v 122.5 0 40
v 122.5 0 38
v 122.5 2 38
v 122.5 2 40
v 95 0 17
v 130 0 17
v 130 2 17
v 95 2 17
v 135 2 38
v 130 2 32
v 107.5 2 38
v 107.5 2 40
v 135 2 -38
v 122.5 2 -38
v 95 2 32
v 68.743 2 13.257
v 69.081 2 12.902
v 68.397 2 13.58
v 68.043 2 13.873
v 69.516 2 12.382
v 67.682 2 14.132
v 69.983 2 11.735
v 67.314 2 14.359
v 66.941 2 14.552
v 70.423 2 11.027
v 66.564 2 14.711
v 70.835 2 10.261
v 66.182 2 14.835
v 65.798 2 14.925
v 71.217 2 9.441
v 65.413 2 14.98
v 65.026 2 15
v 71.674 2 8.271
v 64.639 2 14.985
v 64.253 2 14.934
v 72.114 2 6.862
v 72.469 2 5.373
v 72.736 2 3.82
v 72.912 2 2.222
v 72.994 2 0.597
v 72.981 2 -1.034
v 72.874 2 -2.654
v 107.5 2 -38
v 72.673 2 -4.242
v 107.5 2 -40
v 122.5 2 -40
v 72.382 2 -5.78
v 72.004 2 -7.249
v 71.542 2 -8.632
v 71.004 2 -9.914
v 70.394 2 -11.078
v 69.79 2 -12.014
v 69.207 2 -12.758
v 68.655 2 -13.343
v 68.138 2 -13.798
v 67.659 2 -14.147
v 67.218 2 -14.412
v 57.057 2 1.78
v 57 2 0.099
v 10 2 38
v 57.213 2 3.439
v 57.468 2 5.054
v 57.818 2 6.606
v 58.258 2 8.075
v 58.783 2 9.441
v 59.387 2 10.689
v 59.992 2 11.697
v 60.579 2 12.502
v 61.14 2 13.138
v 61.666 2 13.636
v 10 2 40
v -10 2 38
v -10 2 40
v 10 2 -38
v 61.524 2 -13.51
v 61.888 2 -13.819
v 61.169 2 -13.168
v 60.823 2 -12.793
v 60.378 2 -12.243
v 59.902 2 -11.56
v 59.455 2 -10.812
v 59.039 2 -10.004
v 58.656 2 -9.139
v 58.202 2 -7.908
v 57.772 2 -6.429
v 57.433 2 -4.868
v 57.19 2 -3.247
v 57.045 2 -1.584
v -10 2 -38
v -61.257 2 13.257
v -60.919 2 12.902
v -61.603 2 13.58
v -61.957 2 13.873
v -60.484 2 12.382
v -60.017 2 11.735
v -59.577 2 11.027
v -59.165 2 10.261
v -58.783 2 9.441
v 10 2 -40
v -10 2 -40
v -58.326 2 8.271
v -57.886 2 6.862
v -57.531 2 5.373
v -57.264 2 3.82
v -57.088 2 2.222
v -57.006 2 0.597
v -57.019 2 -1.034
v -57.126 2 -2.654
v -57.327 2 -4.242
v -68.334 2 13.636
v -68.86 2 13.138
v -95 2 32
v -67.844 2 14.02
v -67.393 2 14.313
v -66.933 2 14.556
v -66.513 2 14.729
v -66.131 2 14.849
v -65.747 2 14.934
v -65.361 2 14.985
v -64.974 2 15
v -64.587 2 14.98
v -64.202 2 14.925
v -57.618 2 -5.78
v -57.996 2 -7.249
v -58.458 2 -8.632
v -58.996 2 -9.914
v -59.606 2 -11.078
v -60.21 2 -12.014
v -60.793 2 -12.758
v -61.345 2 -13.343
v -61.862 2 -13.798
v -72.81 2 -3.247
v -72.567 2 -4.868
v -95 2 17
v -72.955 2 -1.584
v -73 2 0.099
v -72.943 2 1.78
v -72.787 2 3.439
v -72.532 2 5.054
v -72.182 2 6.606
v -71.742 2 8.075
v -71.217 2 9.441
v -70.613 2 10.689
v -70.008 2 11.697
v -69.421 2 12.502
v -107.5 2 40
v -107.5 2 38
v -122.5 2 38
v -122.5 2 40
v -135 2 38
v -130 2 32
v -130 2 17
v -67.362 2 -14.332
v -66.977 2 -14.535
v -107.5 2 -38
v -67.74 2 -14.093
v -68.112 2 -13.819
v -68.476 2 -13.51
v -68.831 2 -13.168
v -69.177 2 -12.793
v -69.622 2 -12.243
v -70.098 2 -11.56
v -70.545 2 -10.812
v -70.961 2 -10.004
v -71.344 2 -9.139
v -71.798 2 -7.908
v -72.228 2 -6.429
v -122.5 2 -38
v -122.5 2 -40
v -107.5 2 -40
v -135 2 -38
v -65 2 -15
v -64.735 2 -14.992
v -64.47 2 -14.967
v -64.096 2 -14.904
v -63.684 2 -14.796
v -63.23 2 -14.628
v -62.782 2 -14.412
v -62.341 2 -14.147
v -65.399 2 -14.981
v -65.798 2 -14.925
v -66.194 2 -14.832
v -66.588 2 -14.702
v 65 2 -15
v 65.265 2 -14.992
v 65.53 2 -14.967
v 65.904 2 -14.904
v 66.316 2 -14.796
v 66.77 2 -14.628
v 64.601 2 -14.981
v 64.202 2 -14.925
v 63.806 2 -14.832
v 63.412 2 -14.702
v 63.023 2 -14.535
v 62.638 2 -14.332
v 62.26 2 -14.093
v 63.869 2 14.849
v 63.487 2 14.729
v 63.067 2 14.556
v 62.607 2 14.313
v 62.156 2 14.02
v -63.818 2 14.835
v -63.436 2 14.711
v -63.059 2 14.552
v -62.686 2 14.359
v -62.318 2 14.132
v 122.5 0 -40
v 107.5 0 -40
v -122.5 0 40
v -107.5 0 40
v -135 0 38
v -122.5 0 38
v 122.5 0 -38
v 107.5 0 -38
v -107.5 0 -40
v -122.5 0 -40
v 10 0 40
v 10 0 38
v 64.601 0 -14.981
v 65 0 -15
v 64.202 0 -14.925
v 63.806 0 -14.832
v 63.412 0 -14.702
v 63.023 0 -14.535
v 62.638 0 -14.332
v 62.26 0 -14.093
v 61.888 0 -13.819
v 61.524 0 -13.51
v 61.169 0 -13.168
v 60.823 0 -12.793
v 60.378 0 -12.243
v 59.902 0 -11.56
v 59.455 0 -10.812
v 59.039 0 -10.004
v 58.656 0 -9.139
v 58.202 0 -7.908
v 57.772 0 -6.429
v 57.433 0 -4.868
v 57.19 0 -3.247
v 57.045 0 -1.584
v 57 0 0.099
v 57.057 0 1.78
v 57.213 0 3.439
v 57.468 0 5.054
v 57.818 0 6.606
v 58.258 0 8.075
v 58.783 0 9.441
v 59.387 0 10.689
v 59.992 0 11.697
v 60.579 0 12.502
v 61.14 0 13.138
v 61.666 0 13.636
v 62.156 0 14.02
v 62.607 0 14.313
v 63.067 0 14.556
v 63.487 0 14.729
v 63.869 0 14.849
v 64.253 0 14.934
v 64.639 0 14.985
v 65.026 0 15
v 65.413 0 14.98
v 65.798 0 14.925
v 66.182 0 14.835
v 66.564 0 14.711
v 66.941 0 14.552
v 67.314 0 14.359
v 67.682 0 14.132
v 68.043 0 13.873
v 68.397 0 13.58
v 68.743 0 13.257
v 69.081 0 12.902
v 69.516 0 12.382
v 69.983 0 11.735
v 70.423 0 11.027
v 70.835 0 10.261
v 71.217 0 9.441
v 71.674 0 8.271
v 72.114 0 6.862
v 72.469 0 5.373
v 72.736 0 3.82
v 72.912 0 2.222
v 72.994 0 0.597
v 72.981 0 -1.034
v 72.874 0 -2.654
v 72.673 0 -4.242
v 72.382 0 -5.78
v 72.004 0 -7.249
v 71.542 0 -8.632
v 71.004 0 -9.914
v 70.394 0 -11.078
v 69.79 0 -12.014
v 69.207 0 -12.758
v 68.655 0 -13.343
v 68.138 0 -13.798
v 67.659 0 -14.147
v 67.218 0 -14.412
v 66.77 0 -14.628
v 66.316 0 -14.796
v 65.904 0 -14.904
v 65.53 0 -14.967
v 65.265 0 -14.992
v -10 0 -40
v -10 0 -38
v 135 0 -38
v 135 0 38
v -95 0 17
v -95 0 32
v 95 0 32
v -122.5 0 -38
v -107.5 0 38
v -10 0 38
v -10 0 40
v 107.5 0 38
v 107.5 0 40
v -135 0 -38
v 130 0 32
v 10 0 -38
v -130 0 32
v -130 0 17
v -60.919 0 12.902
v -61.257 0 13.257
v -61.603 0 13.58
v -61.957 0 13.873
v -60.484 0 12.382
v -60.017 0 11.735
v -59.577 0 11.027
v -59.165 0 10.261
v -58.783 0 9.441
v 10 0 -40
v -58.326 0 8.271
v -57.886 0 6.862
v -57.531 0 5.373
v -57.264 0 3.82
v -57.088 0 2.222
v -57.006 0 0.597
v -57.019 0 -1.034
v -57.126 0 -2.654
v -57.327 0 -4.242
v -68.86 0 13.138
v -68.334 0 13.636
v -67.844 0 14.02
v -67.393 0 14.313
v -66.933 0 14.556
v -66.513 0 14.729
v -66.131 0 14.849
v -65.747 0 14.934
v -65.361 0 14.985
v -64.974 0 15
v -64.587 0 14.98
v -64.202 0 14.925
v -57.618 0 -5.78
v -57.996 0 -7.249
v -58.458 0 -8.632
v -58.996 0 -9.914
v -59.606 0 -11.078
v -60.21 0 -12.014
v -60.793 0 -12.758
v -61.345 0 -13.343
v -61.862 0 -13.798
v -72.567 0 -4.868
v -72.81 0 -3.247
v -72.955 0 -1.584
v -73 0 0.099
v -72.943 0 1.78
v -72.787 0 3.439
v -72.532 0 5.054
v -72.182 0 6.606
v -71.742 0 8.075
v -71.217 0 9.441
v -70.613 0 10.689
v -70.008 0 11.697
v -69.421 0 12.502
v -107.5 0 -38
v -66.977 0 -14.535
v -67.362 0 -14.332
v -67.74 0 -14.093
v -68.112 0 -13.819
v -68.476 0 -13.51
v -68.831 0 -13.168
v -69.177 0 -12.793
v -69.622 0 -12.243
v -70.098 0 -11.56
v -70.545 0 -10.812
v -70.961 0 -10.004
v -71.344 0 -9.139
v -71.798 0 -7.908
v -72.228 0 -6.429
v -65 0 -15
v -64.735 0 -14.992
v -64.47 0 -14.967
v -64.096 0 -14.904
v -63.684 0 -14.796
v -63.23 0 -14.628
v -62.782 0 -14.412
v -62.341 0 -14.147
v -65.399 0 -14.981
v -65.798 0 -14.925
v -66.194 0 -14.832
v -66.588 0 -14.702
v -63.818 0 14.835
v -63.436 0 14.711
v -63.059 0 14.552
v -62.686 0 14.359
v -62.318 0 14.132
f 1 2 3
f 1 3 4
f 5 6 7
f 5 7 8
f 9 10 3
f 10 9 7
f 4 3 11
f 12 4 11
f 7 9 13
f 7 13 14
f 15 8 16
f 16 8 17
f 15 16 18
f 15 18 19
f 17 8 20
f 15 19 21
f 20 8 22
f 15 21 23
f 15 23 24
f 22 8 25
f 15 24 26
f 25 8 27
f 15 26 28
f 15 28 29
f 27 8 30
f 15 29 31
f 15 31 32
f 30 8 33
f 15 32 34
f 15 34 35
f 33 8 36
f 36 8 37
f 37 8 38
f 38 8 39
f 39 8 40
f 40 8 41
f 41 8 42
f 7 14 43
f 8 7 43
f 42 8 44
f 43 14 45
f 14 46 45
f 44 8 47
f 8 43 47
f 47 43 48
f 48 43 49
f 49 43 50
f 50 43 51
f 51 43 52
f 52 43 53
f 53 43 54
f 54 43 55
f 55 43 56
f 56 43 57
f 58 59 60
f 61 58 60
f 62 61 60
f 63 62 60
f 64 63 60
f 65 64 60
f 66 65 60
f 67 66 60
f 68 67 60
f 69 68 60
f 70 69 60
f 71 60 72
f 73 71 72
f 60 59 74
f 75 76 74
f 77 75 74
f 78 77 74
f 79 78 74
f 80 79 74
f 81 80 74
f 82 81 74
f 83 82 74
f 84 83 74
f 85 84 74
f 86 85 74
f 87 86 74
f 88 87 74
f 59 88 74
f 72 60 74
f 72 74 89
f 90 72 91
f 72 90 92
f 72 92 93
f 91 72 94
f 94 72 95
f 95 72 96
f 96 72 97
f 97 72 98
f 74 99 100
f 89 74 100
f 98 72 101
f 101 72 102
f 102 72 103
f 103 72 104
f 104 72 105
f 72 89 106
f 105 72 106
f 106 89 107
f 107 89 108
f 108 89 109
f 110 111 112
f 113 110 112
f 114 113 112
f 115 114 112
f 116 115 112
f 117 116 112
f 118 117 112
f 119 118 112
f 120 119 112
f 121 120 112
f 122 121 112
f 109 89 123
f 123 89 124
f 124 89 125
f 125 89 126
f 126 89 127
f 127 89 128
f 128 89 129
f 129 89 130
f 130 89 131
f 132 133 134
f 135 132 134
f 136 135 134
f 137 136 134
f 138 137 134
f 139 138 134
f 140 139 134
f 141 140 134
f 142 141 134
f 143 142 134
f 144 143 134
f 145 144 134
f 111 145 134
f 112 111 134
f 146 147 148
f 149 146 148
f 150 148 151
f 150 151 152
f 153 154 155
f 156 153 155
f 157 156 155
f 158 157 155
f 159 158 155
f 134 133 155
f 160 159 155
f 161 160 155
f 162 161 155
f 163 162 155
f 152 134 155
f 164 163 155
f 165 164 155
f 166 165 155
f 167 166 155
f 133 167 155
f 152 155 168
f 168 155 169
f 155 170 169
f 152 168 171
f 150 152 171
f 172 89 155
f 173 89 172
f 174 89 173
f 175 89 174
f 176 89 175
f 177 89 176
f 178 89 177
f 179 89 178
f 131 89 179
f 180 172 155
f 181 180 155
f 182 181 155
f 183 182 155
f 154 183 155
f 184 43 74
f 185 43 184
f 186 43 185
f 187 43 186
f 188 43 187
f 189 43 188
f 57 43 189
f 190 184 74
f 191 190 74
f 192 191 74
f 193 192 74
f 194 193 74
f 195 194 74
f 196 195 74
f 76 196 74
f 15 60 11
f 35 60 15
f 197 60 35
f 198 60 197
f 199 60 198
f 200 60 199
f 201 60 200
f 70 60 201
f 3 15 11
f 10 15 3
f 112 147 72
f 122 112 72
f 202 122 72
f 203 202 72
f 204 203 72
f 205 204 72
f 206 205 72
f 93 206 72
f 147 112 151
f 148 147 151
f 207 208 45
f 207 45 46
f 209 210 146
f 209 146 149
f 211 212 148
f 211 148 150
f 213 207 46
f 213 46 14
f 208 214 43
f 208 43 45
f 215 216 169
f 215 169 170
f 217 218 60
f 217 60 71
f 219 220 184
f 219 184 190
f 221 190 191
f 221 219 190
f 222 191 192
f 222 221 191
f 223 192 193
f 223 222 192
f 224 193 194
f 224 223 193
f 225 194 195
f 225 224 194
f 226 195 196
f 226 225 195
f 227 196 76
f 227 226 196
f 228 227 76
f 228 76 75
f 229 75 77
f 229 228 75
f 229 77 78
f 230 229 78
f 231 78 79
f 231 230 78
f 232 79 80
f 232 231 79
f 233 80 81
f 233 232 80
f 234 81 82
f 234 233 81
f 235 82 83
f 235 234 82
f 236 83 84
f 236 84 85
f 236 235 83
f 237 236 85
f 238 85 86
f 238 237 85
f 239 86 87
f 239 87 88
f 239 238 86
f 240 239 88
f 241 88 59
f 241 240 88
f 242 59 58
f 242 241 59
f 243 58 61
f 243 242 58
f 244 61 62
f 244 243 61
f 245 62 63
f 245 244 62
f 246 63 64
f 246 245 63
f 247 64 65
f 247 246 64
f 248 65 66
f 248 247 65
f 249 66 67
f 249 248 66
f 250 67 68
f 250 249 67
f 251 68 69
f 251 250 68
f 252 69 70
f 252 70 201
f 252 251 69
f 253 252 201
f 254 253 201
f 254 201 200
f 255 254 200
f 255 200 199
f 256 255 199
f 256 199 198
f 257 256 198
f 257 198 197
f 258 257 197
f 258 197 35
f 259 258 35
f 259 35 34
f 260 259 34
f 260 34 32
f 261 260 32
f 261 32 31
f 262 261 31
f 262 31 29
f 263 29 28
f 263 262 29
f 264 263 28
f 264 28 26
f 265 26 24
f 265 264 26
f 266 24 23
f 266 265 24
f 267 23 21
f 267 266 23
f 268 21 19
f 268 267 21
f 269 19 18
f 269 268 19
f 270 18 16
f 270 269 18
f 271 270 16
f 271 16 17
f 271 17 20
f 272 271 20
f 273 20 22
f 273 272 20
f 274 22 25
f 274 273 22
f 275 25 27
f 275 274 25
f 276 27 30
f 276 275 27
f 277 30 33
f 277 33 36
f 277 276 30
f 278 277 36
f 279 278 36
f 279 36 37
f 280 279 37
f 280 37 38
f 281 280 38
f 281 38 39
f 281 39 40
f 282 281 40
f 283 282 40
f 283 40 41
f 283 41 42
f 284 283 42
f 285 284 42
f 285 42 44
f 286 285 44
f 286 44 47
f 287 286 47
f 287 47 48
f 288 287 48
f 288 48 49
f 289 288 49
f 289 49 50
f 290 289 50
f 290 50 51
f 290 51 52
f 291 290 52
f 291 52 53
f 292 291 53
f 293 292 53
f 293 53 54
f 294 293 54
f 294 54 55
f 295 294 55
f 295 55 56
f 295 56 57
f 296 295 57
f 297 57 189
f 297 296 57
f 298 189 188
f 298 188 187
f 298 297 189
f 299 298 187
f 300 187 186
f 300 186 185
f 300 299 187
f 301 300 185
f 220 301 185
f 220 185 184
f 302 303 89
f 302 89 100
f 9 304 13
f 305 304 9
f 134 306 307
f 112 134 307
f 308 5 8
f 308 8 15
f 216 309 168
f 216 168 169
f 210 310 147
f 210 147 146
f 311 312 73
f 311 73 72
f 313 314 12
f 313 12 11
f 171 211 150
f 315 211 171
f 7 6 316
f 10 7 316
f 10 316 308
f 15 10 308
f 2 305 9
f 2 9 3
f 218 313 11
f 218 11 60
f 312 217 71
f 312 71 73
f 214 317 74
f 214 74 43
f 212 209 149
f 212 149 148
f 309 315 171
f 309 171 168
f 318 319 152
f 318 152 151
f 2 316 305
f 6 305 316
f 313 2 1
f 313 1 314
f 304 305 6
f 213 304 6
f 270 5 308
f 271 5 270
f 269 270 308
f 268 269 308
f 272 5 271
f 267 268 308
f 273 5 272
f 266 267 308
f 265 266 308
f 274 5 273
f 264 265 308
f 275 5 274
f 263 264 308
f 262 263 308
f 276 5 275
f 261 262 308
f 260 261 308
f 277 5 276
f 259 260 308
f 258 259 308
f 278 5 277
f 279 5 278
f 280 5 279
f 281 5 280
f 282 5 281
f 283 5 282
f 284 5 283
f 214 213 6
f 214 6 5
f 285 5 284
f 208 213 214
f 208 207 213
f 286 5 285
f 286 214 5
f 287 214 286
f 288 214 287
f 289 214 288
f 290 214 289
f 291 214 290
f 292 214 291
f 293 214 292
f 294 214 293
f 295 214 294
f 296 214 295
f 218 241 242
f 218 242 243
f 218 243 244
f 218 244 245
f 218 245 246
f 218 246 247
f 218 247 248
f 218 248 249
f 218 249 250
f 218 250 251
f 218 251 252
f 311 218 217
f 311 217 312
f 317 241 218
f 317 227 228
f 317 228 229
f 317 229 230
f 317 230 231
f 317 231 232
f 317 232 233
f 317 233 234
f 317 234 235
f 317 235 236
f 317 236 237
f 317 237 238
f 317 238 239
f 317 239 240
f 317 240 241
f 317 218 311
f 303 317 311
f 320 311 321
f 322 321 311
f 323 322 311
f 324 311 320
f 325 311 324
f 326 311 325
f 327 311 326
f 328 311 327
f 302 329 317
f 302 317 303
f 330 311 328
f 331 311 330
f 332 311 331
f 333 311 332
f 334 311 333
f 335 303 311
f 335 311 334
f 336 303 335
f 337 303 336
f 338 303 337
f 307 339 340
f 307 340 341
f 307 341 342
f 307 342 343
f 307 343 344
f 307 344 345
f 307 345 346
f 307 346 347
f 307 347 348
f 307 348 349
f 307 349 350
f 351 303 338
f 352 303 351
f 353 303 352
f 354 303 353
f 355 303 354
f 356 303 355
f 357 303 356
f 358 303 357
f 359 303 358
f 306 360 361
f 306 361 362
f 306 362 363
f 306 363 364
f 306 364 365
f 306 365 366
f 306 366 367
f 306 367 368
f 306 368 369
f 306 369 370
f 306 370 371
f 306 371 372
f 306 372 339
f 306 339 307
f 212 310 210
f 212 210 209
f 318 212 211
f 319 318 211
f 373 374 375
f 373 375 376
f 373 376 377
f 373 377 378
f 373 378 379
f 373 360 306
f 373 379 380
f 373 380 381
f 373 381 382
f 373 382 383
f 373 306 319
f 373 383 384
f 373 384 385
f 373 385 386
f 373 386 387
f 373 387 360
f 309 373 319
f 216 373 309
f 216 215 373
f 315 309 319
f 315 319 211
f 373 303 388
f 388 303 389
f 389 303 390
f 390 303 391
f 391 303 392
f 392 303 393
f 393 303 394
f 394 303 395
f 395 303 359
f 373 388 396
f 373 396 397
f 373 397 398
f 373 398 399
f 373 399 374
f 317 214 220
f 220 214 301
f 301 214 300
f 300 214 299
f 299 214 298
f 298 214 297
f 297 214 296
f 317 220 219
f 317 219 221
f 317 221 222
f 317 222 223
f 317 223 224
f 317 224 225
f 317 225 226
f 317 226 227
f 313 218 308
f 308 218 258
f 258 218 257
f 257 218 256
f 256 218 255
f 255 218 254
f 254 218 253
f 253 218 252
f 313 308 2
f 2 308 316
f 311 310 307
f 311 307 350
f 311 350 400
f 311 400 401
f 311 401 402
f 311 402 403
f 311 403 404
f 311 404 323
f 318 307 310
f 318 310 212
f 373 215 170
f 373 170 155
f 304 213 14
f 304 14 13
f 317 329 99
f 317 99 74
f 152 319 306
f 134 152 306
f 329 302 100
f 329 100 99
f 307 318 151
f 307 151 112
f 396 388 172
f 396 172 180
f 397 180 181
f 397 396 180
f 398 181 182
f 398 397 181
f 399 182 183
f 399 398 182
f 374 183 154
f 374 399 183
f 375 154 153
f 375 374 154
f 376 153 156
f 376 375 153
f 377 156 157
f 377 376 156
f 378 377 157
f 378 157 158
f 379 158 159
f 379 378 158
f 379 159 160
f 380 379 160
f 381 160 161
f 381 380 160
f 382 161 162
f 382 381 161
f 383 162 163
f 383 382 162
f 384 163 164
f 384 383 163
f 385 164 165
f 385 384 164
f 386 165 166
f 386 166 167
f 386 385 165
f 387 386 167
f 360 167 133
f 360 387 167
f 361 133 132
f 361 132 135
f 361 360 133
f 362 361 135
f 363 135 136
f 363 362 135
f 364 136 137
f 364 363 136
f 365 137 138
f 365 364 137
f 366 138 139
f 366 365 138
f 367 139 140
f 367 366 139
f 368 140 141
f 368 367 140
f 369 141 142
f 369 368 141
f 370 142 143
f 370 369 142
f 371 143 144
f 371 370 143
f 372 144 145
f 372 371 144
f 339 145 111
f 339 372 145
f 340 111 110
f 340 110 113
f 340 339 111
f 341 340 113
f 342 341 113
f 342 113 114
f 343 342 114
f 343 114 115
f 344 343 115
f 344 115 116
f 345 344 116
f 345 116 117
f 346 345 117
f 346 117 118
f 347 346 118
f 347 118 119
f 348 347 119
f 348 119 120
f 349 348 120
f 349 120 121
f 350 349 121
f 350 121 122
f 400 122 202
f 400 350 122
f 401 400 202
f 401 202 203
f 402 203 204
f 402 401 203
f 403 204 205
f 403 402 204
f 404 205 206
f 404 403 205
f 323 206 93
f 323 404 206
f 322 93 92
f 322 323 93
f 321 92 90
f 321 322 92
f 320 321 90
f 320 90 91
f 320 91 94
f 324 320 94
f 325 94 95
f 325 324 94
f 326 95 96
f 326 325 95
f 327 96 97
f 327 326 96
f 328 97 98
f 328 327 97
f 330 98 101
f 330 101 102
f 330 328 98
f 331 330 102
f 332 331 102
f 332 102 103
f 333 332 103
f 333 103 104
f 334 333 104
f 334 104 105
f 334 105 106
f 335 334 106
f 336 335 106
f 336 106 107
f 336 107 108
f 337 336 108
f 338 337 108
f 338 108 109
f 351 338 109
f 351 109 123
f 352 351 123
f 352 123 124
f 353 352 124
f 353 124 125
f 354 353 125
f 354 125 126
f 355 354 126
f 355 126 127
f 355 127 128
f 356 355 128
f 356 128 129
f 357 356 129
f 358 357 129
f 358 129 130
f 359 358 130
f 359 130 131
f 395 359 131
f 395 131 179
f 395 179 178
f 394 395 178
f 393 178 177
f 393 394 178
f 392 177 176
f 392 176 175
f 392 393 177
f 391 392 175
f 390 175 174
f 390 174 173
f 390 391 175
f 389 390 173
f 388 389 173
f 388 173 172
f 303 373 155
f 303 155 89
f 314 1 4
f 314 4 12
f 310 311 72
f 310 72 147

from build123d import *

# Parameters (mm, degrees)
SKETCH_1_RX         = 15
SKETCH_1_RY         = 8
EXTRUDE_1_DEPTH     = 2
SKETCH_2_W          = 35
SKETCH_2_H          = 15
CUT_EXTRUDE_1_DEPTH = 141.815482103


with BuildPart() as part:
    # 草图1 → 凸台-拉伸1 (new body)
    with BuildSketch(Plane(origin=(0, 0, 0), x_dir=(1, 0, 0), z_dir=(0, 1, 0))):
        Polygon((-107.5, 38), (-10, 38), (-10, 40), (10, 40), (10, 38), (107.5, 38), (107.5, 40), (122.5, 40), (122.5, 38), (135, 38), (135, -38), (122.5, -38), (122.5, -40), (107.5, -40), (107.5, -38), (10, -38), (10, -40), (-10, -40), (-10, -38), (-107.5, -38), (-107.5, -40), (-122.5, -40), (-122.5, -38), (-135, -38), (-135, 38), (-122.5, 38), (-122.5, 40), (-107.5, 40), align=None)
        with Locations(Location((-65, 0), (0, 0, 90))):
            Ellipse(SKETCH_1_RX, SKETCH_1_RY, mode=Mode.SUBTRACT)
        with Locations(Location((65, 0), (0, 0, 90))):
            Ellipse(SKETCH_1_RX, SKETCH_1_RY, mode=Mode.SUBTRACT)
    extrude(amount=EXTRUDE_1_DEPTH)

    # 草图2 → 切除-拉伸1 (cut, through all)
    with BuildSketch(Plane.XZ):
        with Locations((-112.5, 24.5)):
            Rectangle(SKETCH_2_W, SKETCH_2_H)
    cut_extrude_1 = extrude(amount=-CUT_EXTRUDE_1_DEPTH, mode=Mode.SUBTRACT)

    # 镜向1: 切除-拉伸1 across plane
    add(cut_extrude_1.mirror(Plane(origin=(0, 0, 0), x_dir=(0, 0, 1), z_dir=(1, 0, 0))), mode=Mode.SUBTRACT)


solid = part.part
